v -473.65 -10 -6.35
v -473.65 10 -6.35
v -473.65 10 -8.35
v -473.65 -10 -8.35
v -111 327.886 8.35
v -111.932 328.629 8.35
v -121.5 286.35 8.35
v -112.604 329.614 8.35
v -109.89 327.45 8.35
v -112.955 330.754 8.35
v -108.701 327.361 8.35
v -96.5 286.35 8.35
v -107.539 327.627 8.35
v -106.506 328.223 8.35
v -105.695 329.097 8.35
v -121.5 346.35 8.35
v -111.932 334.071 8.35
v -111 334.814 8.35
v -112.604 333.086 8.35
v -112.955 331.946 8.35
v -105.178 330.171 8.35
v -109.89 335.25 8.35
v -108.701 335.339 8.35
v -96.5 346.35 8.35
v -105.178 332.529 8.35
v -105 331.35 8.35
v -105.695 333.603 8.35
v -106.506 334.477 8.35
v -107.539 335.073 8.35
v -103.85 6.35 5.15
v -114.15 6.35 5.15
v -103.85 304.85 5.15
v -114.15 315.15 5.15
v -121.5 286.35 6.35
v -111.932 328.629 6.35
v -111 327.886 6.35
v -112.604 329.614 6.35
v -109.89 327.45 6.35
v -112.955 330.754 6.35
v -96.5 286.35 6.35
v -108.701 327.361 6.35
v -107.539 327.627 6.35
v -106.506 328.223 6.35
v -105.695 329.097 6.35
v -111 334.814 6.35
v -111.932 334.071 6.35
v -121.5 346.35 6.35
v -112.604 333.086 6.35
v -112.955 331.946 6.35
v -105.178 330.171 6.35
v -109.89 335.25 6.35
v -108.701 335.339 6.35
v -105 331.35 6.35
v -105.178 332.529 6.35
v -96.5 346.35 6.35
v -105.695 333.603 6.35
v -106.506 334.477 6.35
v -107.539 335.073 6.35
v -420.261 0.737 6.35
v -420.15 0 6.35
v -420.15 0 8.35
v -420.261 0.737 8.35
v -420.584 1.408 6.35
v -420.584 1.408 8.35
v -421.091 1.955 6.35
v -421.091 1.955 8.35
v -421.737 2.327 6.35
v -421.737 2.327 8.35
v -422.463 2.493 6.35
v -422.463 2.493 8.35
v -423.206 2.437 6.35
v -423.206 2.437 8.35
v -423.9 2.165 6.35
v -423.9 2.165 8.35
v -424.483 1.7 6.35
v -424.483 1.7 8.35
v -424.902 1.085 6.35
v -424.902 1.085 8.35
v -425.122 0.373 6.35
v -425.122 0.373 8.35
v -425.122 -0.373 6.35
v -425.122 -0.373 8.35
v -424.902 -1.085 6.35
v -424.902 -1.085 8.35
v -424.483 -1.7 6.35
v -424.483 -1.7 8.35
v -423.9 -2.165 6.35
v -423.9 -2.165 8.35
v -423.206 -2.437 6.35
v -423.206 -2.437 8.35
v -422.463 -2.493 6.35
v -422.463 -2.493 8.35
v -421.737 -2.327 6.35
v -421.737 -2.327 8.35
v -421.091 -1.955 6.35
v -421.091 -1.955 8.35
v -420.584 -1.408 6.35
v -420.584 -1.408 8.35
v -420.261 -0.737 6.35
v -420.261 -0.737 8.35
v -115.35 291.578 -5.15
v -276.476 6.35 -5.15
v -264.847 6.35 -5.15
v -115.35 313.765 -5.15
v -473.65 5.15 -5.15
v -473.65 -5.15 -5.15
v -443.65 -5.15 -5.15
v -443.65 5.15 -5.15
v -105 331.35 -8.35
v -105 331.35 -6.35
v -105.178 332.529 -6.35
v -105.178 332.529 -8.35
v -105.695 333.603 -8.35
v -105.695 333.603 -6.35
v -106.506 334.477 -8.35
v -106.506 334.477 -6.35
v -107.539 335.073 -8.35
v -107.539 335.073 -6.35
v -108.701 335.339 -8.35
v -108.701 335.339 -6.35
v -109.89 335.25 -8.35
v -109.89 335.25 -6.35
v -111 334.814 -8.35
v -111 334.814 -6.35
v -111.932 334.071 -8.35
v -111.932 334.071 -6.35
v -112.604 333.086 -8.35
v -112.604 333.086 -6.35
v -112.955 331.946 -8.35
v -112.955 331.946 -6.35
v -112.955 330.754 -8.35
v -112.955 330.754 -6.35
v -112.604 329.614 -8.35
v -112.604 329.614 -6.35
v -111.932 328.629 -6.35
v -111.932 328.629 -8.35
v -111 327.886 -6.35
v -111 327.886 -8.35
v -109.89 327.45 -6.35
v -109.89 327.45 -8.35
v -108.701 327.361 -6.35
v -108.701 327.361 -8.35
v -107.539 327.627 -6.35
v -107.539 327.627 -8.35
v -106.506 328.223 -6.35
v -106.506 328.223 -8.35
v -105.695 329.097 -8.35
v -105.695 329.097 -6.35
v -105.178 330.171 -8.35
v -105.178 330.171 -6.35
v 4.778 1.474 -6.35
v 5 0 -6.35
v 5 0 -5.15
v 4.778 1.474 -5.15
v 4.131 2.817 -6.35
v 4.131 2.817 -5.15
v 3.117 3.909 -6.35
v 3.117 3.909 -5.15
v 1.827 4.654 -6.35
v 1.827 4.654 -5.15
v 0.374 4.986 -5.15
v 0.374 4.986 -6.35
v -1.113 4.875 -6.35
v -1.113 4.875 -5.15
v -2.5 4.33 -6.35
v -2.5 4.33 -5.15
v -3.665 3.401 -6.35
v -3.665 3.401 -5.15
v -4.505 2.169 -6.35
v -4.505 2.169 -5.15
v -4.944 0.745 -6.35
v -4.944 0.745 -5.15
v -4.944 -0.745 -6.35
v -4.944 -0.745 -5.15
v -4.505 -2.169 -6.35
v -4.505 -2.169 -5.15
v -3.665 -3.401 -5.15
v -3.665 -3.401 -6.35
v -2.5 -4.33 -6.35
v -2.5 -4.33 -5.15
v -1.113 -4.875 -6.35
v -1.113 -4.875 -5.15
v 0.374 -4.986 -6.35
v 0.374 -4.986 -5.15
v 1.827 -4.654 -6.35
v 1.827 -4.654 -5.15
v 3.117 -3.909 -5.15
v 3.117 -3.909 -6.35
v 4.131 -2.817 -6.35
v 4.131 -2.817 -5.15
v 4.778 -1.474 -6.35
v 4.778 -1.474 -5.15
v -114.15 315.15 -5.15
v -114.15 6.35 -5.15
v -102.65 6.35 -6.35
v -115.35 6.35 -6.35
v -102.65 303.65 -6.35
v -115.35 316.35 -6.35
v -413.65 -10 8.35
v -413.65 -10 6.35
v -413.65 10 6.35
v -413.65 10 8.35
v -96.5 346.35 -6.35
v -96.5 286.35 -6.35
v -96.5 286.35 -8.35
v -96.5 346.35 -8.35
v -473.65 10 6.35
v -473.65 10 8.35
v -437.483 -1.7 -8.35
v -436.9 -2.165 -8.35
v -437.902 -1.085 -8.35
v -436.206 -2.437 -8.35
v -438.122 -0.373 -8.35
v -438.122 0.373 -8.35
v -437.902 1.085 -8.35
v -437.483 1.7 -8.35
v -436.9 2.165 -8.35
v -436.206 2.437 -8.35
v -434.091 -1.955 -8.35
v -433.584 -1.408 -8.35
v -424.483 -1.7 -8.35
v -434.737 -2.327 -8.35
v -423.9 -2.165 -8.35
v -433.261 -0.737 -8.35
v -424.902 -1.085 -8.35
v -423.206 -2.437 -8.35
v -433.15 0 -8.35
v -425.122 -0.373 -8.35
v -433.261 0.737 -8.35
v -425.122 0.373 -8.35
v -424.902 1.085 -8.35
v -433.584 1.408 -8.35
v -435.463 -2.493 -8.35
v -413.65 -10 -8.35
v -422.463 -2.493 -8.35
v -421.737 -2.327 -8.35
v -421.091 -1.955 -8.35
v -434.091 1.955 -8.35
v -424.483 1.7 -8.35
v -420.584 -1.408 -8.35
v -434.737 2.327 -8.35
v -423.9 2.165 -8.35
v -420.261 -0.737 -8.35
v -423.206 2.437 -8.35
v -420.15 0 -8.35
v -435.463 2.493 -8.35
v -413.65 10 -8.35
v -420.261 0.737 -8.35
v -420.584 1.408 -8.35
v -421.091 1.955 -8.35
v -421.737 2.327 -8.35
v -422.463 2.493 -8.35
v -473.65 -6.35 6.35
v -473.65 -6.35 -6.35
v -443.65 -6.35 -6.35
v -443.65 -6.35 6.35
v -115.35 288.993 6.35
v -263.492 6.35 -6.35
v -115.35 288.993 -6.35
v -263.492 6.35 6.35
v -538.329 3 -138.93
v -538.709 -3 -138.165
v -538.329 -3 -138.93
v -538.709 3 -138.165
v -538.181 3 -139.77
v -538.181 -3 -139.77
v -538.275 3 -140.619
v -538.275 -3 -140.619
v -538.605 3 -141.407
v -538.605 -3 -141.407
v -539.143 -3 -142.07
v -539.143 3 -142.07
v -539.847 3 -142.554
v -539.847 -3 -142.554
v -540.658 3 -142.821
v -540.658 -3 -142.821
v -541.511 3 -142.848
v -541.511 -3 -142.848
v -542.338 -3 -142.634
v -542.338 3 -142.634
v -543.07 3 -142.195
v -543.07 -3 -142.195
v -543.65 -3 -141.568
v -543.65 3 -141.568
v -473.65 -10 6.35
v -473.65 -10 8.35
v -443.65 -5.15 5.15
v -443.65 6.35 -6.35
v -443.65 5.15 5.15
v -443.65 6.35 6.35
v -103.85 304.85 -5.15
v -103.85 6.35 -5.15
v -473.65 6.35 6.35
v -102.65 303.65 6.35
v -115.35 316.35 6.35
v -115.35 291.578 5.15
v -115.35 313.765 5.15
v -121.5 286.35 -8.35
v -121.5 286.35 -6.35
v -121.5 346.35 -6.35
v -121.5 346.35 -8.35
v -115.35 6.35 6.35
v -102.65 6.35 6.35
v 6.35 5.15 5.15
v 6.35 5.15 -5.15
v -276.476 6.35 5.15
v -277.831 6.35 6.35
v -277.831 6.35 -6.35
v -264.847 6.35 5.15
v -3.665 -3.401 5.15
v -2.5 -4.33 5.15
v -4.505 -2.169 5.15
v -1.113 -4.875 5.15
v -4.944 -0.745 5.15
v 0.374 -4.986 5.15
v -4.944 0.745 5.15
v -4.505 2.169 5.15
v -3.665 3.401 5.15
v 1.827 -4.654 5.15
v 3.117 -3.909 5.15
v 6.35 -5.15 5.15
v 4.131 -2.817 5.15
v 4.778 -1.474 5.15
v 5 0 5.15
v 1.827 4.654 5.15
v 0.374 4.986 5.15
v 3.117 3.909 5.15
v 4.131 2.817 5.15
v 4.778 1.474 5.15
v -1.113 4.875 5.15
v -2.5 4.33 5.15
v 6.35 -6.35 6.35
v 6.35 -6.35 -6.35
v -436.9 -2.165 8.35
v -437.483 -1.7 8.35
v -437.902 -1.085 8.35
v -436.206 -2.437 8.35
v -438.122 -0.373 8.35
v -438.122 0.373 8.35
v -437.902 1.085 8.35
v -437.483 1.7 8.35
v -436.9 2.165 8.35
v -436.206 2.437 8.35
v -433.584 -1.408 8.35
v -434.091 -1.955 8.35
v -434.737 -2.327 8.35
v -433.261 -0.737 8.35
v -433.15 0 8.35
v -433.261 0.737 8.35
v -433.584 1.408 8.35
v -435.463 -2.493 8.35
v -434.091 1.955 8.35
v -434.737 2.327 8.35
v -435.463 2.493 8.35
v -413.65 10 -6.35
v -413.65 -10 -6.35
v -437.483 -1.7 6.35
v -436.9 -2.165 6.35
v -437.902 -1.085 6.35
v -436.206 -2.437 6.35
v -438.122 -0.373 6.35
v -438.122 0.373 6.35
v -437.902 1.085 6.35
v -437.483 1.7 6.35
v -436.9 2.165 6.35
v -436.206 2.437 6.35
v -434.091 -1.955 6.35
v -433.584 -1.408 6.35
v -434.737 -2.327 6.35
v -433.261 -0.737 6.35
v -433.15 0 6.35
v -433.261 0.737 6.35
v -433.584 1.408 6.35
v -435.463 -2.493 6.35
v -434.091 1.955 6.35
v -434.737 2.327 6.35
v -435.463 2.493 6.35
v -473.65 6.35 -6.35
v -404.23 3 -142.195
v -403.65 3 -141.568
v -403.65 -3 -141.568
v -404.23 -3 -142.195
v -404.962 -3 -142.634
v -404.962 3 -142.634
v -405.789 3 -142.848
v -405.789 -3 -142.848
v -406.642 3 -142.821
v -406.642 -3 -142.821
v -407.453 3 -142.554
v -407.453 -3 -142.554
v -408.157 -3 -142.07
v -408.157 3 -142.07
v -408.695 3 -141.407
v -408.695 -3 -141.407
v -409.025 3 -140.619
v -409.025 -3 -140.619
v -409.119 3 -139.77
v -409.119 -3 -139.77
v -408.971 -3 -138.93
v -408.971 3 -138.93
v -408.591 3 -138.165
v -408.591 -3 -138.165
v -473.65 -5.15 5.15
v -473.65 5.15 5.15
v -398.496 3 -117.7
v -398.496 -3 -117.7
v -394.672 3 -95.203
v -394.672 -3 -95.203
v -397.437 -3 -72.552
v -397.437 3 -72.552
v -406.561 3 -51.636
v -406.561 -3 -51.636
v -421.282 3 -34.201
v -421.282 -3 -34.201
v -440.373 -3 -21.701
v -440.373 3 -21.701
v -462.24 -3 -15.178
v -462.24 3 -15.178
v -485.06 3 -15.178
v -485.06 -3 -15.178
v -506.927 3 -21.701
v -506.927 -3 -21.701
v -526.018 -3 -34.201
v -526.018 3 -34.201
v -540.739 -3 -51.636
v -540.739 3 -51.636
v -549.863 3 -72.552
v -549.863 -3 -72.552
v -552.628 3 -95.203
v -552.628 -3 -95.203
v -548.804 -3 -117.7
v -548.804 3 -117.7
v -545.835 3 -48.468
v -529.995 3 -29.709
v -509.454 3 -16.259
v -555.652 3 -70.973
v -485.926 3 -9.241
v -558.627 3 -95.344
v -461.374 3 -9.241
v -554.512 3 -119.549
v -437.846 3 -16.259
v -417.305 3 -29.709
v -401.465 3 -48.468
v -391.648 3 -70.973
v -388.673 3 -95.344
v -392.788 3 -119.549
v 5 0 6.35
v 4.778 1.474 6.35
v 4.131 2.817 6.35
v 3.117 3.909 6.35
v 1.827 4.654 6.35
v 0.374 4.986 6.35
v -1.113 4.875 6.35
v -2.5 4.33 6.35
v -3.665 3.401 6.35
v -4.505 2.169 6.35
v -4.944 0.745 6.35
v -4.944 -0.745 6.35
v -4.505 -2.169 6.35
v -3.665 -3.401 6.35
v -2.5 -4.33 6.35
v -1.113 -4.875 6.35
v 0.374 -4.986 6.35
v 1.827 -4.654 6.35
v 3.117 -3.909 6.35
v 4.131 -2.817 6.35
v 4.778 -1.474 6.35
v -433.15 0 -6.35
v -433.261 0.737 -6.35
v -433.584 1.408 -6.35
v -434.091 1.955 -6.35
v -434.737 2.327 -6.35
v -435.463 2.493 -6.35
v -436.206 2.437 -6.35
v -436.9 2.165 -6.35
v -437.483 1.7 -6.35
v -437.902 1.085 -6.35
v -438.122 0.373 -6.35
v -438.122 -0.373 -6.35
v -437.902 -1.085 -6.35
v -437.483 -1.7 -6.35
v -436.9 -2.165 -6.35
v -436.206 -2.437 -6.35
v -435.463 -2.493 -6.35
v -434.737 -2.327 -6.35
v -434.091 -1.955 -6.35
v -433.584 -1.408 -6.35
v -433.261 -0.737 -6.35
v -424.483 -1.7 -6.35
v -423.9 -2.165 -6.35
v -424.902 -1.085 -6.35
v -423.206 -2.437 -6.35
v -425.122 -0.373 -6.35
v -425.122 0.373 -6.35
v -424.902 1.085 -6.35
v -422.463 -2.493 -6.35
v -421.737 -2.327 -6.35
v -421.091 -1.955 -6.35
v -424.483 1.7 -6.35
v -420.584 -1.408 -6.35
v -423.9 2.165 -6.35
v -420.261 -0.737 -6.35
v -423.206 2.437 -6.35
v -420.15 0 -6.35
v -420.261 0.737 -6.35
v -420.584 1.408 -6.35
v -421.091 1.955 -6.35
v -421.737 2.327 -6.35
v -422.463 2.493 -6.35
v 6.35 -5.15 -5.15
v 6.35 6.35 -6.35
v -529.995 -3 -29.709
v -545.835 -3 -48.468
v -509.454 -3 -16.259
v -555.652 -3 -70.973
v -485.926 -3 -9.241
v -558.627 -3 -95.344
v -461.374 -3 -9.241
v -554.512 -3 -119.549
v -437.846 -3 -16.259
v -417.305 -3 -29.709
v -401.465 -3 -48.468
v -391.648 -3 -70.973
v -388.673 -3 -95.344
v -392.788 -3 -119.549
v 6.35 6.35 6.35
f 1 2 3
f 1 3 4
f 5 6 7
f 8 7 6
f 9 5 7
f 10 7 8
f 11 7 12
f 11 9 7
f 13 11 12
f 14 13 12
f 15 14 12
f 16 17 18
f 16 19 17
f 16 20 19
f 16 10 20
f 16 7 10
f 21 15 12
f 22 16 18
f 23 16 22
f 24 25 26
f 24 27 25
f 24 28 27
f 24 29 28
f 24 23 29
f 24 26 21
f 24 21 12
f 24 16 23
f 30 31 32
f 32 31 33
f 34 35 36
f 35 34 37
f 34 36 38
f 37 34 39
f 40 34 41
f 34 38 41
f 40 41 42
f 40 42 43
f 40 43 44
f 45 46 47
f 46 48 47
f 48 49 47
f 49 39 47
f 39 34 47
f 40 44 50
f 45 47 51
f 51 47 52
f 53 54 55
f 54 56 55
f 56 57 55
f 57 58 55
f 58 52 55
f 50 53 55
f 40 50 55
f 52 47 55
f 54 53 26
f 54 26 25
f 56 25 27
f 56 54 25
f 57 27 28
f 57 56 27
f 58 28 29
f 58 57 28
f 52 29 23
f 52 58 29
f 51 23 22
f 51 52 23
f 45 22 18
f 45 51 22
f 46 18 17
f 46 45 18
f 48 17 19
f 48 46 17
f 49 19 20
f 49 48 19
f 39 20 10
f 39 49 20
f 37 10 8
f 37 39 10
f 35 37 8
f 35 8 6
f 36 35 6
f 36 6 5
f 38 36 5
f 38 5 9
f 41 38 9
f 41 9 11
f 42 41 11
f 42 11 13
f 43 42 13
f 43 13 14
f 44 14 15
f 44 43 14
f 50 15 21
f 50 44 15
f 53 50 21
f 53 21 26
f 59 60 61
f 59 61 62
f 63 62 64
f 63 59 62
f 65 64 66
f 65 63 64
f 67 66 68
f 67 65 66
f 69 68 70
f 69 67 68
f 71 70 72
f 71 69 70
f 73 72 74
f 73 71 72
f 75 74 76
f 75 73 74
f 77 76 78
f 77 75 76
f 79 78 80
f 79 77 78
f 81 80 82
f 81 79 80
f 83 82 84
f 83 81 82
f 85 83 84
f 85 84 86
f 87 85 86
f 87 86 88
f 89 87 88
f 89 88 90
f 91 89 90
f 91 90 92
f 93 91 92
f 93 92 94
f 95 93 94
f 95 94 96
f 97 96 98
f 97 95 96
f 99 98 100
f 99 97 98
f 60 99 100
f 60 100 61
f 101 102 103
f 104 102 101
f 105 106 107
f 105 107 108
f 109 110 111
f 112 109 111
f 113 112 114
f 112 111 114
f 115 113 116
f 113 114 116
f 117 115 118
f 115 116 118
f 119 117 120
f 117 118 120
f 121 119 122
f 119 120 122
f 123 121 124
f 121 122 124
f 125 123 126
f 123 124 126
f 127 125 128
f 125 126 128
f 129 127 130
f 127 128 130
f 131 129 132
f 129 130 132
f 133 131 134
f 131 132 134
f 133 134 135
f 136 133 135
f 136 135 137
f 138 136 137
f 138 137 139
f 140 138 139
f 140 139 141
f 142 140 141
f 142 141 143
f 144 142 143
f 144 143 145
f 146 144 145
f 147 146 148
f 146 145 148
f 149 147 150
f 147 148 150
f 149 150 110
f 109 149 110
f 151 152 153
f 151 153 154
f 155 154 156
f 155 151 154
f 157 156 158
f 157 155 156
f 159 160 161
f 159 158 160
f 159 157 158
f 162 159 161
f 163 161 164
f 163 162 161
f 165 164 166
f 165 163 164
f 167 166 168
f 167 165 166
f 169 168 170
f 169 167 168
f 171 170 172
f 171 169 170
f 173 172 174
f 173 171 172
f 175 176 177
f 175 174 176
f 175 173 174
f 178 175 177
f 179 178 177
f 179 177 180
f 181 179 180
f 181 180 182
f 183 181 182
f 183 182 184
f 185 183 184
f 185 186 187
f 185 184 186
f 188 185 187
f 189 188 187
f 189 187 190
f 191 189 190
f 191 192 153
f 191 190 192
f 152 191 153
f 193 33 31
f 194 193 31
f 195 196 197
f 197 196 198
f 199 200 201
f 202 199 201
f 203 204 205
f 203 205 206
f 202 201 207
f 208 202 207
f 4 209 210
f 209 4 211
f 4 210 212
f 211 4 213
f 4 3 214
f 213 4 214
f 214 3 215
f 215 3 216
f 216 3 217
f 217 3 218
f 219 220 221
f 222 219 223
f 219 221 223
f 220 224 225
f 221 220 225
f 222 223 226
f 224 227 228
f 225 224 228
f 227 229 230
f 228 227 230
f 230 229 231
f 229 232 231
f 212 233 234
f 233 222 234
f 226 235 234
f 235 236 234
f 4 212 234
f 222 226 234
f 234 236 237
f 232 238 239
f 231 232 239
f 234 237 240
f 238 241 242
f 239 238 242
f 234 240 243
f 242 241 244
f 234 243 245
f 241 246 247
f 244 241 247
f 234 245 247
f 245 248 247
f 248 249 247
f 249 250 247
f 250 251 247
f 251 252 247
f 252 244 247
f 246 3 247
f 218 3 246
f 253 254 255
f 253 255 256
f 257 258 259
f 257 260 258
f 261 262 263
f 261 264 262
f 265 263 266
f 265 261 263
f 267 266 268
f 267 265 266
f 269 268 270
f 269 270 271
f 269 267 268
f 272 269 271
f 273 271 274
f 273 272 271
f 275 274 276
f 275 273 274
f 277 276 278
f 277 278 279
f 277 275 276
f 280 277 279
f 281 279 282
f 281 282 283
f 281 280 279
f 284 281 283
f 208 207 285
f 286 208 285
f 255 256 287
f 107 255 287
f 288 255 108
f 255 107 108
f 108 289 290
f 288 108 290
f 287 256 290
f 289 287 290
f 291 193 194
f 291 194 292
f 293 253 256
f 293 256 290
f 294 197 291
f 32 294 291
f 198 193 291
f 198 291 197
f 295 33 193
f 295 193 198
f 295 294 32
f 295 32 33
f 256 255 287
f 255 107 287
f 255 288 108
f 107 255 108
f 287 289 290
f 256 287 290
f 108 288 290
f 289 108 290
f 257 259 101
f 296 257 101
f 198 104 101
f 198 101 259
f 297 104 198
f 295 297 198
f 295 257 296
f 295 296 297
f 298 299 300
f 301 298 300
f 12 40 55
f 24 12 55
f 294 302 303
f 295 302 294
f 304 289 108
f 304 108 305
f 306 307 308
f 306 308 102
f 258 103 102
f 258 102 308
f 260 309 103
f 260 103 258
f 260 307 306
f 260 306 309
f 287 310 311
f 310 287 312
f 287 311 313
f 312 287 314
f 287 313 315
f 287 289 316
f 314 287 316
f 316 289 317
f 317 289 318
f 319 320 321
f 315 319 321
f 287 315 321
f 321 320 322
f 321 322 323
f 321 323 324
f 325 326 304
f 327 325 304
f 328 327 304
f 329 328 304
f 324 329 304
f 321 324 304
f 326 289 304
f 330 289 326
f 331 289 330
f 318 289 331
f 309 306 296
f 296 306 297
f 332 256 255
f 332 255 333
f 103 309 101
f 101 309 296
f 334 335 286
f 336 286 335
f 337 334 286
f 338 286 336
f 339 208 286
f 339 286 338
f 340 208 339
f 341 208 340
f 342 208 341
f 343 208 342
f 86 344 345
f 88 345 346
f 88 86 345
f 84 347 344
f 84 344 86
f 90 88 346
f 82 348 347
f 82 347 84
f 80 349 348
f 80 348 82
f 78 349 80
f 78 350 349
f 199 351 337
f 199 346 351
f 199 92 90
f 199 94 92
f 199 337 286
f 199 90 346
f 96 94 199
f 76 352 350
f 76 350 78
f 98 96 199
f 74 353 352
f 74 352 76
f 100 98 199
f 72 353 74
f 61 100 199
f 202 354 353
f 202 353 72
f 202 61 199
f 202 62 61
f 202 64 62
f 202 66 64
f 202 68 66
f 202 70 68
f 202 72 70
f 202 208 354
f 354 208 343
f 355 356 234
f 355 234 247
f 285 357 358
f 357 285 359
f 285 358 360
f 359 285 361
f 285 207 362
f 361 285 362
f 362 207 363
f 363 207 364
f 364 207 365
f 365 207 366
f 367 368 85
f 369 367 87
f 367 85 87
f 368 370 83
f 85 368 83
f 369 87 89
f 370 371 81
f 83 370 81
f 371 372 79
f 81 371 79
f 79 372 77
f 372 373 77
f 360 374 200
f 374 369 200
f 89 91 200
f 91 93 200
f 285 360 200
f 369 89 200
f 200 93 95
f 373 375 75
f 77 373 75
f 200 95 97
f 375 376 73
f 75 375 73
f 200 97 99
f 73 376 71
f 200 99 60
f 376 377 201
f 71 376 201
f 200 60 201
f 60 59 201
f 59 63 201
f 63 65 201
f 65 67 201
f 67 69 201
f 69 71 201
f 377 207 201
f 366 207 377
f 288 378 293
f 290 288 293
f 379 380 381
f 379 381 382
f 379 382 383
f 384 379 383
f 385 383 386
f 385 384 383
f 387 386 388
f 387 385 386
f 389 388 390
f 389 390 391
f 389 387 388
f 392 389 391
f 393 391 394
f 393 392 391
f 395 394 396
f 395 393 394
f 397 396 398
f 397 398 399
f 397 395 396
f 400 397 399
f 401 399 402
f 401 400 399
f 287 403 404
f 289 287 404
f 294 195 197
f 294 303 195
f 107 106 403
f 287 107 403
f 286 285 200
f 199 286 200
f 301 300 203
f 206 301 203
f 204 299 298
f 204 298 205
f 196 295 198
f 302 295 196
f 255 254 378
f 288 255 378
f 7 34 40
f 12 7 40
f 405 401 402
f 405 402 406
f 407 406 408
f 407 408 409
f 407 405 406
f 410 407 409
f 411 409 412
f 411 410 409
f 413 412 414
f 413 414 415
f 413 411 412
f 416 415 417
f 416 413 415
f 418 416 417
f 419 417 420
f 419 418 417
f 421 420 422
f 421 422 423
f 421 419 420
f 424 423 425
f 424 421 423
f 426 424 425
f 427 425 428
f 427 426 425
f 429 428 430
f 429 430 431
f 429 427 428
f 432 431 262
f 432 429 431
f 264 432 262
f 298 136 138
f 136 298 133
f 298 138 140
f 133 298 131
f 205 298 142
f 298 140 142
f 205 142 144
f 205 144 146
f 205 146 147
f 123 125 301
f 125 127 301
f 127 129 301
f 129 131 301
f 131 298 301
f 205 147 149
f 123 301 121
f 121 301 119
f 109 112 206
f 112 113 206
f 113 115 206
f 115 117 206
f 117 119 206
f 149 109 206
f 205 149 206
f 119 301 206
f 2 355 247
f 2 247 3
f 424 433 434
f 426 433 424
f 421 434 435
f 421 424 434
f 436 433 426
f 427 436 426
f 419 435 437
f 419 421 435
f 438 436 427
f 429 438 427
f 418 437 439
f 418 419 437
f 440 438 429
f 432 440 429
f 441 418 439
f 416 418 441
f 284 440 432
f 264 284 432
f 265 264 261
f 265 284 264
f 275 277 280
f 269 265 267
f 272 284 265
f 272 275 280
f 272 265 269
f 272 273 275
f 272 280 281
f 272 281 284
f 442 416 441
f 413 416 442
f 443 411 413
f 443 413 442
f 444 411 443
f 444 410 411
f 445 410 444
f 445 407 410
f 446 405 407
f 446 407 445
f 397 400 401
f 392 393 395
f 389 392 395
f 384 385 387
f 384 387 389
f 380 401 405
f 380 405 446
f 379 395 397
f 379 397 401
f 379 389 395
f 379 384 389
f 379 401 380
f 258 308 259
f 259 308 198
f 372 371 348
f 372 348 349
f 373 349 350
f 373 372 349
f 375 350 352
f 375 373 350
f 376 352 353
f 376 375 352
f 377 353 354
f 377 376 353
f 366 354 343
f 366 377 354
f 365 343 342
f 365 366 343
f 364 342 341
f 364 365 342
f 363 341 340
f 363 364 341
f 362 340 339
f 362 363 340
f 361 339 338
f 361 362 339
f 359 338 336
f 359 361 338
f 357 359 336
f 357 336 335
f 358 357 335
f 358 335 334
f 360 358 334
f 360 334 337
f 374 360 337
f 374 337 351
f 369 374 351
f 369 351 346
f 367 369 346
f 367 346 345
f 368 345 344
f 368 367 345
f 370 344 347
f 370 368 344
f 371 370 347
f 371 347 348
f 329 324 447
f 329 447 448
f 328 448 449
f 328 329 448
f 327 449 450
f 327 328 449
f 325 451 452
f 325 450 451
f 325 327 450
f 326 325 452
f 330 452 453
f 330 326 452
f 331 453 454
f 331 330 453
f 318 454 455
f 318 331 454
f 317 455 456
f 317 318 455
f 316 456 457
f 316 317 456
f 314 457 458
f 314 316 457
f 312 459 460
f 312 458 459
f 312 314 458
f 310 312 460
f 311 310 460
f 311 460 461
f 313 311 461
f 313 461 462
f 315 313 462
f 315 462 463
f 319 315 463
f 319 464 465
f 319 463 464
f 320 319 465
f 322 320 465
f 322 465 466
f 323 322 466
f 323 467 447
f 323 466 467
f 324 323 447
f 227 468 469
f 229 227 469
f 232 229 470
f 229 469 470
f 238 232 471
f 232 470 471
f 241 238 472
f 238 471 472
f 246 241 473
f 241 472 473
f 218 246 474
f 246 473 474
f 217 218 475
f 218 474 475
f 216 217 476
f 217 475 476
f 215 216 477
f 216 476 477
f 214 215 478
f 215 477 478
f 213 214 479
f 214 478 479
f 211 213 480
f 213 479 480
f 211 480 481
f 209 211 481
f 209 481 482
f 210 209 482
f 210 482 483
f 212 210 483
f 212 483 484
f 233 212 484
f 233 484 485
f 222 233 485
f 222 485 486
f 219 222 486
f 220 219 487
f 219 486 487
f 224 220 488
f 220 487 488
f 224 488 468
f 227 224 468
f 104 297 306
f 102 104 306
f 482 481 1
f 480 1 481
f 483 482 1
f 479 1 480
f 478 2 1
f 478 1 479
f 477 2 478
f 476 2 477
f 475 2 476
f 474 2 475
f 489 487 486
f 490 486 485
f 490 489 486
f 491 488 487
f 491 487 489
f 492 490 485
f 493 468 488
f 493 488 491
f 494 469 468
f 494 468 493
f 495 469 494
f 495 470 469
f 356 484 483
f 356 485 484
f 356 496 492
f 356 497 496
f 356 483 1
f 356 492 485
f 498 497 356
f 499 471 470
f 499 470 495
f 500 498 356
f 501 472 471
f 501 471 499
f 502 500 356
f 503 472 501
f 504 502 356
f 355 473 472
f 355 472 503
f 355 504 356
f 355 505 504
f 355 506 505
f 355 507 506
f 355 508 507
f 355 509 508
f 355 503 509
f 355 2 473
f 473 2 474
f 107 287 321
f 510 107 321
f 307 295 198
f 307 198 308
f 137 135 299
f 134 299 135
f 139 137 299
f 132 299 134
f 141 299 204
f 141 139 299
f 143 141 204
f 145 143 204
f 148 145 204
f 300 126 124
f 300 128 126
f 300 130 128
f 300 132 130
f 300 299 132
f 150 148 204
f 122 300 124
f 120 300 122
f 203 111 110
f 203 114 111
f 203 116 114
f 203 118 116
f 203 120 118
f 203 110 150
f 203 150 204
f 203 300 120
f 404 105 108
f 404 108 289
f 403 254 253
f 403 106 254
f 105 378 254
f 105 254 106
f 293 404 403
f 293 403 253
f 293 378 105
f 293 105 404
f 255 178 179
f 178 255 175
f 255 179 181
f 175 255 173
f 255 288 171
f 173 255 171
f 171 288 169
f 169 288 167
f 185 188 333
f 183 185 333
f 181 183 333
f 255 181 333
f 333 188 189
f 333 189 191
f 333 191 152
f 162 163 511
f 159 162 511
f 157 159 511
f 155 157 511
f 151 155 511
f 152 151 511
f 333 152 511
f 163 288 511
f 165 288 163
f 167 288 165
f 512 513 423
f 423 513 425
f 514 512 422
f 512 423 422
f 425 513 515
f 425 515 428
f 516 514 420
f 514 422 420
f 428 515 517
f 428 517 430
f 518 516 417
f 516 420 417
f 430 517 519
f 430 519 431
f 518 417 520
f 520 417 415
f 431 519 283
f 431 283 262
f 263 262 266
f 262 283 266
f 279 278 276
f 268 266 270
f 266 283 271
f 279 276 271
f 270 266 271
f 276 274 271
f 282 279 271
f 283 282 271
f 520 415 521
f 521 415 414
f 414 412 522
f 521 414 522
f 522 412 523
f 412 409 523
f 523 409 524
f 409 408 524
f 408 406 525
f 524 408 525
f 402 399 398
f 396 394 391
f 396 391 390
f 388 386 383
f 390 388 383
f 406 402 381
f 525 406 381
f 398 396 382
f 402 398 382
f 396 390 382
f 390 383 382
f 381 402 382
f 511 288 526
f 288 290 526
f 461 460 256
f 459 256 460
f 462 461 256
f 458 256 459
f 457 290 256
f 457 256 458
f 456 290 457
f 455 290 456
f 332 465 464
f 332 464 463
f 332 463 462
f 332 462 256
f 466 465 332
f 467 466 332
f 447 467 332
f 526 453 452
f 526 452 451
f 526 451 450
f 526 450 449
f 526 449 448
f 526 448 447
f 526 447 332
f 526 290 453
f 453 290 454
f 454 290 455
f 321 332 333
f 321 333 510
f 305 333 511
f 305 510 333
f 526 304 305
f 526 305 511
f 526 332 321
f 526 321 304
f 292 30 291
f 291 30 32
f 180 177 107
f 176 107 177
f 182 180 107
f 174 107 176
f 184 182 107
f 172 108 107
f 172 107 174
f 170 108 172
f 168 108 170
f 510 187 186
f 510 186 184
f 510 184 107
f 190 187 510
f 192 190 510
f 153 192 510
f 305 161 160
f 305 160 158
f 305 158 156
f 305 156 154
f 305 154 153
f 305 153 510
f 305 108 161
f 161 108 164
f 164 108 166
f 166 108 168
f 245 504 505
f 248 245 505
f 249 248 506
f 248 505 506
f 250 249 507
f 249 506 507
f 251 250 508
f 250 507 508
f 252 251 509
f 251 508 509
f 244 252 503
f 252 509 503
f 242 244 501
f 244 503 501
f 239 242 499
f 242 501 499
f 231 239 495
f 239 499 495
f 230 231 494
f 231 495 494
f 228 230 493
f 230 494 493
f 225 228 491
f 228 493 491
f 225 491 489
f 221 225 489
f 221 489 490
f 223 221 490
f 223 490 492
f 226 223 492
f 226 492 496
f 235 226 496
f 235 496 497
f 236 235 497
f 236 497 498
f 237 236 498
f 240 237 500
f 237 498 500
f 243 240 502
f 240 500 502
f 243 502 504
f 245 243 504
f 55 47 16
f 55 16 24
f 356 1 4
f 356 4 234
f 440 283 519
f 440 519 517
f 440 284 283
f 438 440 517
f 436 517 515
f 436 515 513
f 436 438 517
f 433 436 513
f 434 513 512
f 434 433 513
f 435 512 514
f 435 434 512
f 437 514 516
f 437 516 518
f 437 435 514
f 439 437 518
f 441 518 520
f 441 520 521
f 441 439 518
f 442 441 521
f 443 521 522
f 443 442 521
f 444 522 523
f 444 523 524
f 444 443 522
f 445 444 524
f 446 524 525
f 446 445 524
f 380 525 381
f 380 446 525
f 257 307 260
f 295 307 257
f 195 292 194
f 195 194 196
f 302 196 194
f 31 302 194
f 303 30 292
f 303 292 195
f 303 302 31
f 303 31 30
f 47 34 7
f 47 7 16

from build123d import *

# Parameters (mm, degrees)
SKETCH1_W               = 450
SKETCH1_H               = 12.7
SKETCH1_R               = 5
BOSS_EXTRUDE1_DEPTH     = 6.35
SHELL1_T                = -1.2
BOSS_EXTRUDE2_DEPTH     = 6.35
SHELL2_T                = -1.2
BOSS_EXTRUDE3_DEPTH     = 6.35
SHELL3_T                = -1.2
BOSS_EXTRUDE4_START     = 6.35
SKETCH1_5_W             = 25
SKETCH1_5_H             = 60
SKETCH1_5_R             = 4
BOSS_EXTRUDE4_DEPTH     = 2
CUT_EXTRUDE1_DEPTH      = 563.897297471
CUT_EXTRUDE1_DEPTH_BACK = 563.897297471
SKETCH1_6_R             = 5
SKETCH2_W               = 30
SKETCH2_H               = 12.7
SKETCH2_R               = 2.5
BOSS_EXTRUDE5_DEPTH     = 2
SKETCH4_W               = 12.7
SKETCH4_H               = 12.7
SKETCH4_W_2             = 10.3
SKETCH4_H_2             = 10.3
BOSS_EXTRUDE7_DEPTH     = 30
BOSS_EXTRUDE8_START     = -12.7
SKETCH2_6_W             = 30
SKETCH2_6_H             = 12.7
SKETCH2_6_R             = 2.5
BOSS_EXTRUDE8_DEPTH     = 2
BOSS_EXTRUDE9_DEPTH     = 3


with BuildPart() as part:
    # Sketch1 → Boss-Extrude1 (new, symmetric)
    # profile 1 of 2: a face of its own
    with BuildSketch(Plane.XY):
        with Locations((-218.65, 0)):
            Rectangle(SKETCH1_W, SKETCH1_H)
        Circle(SKETCH1_R, mode=Mode.SUBTRACT)
    # profile 2 of 2: a face of its own
    with BuildSketch(Plane.XY):
        Circle(SKETCH1_R)
    extrude(amount=BOSS_EXTRUDE1_DEPTH, both=True)

    # Shell1
    shell1_openings = [part.faces().sort_by_distance(p)[0] for p in [
        (-443.65, 0, 0),
        (6.35, 0, 0),
    ]]
    offset(amount=SHELL1_T, openings=shell1_openings, kind=Kind.INTERSECTION)

    # Sketch1<6> → Cut-Extrude1 (cut, two sides: drawn at the far end of the back side and taken through both)
    with BuildSketch(Plane.XY.offset(-CUT_EXTRUDE1_DEPTH_BACK)):
        Circle(SKETCH1_6_R)
    extrude(amount=CUT_EXTRUDE1_DEPTH + CUT_EXTRUDE1_DEPTH_BACK, mode=Mode.SUBTRACT)


with BuildPart() as body_2:
    # Sketch1<3> → Boss-Extrude2 (new, symmetric)
    with BuildSketch(Plane.XY):
        Polygon((-115.35, 288.99291613), (-115.35, 316.35), (-277.830768093, 6.35), (-263.492058415, 6.35), align=None)
    extrude(amount=BOSS_EXTRUDE2_DEPTH, both=True)

    # Shell2
    shell2_openings = [body_2.faces().sort_by_distance(p)[0] for p in [
        (-270.661413254, 6.35, 0),
        (-115.35, 302.671458065, 0),
    ]]
    offset(amount=SHELL2_T, openings=shell2_openings, kind=Kind.INTERSECTION)


with BuildPart() as body_3:
    # Sketch1<4> → Boss-Extrude3 (new, symmetric)
    with BuildSketch(Plane.XY):
        Polygon((-102.65, 303.65), (-115.35, 316.35), (-115.35, 6.35), (-102.65, 6.35), align=None)
    extrude(amount=BOSS_EXTRUDE3_DEPTH, both=True)

    # Shell3
    shell3_openings = [body_3.faces().sort_by_distance(p)[0] for p in [
        (-109, 6.35, 0),
        (-109, 310, 0),
    ]]
    offset(amount=SHELL3_T, openings=shell3_openings, kind=Kind.INTERSECTION)


with BuildPart() as body_4:
    # Sketch1<5> → Boss-Extrude4 (new body)
    with BuildSketch(Plane.XY.offset(BOSS_EXTRUDE4_START)):
        with Locations((-109, 316.35)):
            Rectangle(SKETCH1_5_W, SKETCH1_5_H)
        with Locations((-109, 331.35)):
            Circle(SKETCH1_5_R, mode=Mode.SUBTRACT)
    extrude(amount=BOSS_EXTRUDE4_DEPTH)


with BuildPart() as body_5:
    # Mirror1: mirrored copy
    add(body_4.part.mirror(Plane.XY))


with BuildPart() as body_6:
    # Sketch2 → Boss-Extrude5 (new body)
    # profile 1 of 4: a face of its own
    with BuildSketch(Plane.XY.offset(6.35)):
        Polygon((-443.65, -6.35), (-473.65, -6.35), (-473.65, -10), (-413.65, -10), (-413.65, -6.35), align=None)
    # profile 2 of 4: a face of its own
    with BuildSketch(Plane.XY.offset(6.35)):
        with Locations((-428.65, 0)):
            Rectangle(SKETCH2_W, SKETCH2_H)
        with Locations((-435.65, 0)):
            Circle(SKETCH2_R, mode=Mode.SUBTRACT)
        with Locations((-422.65, 0)):
            Circle(SKETCH2_R, mode=Mode.SUBTRACT)
    # profile 3 of 4: a face of its own
    with BuildSketch(Plane.XY.offset(6.35)):
        with Locations((-458.65, 0)):
            Rectangle(SKETCH2_W, SKETCH2_H)
    # profile 4 of 4: a face of its own
    with BuildSketch(Plane.XY.offset(6.35)):
        Polygon((-413.65, 10), (-473.65, 10), (-473.65, 6.35), (-443.65, 6.35), (-413.65, 6.35), align=None)
    extrude(amount=BOSS_EXTRUDE5_DEPTH)


with BuildPart() as body_7:
    # Sketch4 → Boss-Extrude7 (new body)
    with BuildSketch(Plane.ZY.offset(443.65)):
        Rectangle(SKETCH4_W, SKETCH4_H)
        Rectangle(SKETCH4_W_2, SKETCH4_H_2, mode=Mode.SUBTRACT)
    extrude(amount=BOSS_EXTRUDE7_DEPTH)


with BuildPart() as body_8:
    # Sketch2<6> → Boss-Extrude8 (new body)
    # profile 1 of 4: a face of its own
    with BuildSketch(Plane.XY.offset(6.35).offset(BOSS_EXTRUDE8_START)):
        Polygon((-443.65, -6.35), (-473.65, -6.35), (-473.65, -10), (-413.65, -10), (-413.65, -6.35), align=None)
    # profile 2 of 4: a face of its own
    with BuildSketch(Plane.XY.offset(6.35).offset(BOSS_EXTRUDE8_START)):
        with Locations((-458.65, 0)):
            Rectangle(SKETCH2_6_W, SKETCH2_6_H)
    # profile 3 of 4: a face of its own
    with BuildSketch(Plane.XY.offset(6.35).offset(BOSS_EXTRUDE8_START)):
        with Locations((-428.65, 0)):
            Rectangle(SKETCH2_6_W, SKETCH2_6_H)
        with Locations((-435.65, 0)):
            Circle(SKETCH2_6_R, mode=Mode.SUBTRACT)
        with Locations((-422.65, 0)):
            Circle(SKETCH2_6_R, mode=Mode.SUBTRACT)
    # profile 4 of 4: a face of its own
    with BuildSketch(Plane.XY.offset(6.35).offset(BOSS_EXTRUDE8_START)):
        Polygon((-413.65, 10), (-473.65, 10), (-473.65, 6.35), (-443.65, 6.35), (-413.65, 6.35), align=None)
    extrude(amount=-BOSS_EXTRUDE8_DEPTH)


with BuildPart() as body_9:
    # Sketch5 → Boss-Extrude9 (new, symmetric)
    with BuildSketch(Plane(origin=(0, 0, 0), x_dir=(1, 0, 0), z_dir=(0, 1, 0))):
        with BuildLine():
            ThreePointArc((-543.65, 141.568253805), (-473.65, 8.35), (-403.65, 141.568253805))
            ThreePointArc((-403.65, 141.568253805), (-407.822408958, 142.337021318), (-408.591176471, 138.16461236))
            ThreePointArc((-408.591176471, 138.16461236), (-473.65, 14.35), (-538.708823529, 138.16461236))
            ThreePointArc((-538.708823529, 138.16461236), (-539.477591042, 142.337021318), (-543.65, 141.568253805))
        make_face()
    extrude(amount=BOSS_EXTRUDE9_DEPTH, both=True)


solid = Compound([part.part, body_2.part, body_3.part, body_4.part, body_5.part, body_6.part, body_7.part, body_8.part, body_9.part])
